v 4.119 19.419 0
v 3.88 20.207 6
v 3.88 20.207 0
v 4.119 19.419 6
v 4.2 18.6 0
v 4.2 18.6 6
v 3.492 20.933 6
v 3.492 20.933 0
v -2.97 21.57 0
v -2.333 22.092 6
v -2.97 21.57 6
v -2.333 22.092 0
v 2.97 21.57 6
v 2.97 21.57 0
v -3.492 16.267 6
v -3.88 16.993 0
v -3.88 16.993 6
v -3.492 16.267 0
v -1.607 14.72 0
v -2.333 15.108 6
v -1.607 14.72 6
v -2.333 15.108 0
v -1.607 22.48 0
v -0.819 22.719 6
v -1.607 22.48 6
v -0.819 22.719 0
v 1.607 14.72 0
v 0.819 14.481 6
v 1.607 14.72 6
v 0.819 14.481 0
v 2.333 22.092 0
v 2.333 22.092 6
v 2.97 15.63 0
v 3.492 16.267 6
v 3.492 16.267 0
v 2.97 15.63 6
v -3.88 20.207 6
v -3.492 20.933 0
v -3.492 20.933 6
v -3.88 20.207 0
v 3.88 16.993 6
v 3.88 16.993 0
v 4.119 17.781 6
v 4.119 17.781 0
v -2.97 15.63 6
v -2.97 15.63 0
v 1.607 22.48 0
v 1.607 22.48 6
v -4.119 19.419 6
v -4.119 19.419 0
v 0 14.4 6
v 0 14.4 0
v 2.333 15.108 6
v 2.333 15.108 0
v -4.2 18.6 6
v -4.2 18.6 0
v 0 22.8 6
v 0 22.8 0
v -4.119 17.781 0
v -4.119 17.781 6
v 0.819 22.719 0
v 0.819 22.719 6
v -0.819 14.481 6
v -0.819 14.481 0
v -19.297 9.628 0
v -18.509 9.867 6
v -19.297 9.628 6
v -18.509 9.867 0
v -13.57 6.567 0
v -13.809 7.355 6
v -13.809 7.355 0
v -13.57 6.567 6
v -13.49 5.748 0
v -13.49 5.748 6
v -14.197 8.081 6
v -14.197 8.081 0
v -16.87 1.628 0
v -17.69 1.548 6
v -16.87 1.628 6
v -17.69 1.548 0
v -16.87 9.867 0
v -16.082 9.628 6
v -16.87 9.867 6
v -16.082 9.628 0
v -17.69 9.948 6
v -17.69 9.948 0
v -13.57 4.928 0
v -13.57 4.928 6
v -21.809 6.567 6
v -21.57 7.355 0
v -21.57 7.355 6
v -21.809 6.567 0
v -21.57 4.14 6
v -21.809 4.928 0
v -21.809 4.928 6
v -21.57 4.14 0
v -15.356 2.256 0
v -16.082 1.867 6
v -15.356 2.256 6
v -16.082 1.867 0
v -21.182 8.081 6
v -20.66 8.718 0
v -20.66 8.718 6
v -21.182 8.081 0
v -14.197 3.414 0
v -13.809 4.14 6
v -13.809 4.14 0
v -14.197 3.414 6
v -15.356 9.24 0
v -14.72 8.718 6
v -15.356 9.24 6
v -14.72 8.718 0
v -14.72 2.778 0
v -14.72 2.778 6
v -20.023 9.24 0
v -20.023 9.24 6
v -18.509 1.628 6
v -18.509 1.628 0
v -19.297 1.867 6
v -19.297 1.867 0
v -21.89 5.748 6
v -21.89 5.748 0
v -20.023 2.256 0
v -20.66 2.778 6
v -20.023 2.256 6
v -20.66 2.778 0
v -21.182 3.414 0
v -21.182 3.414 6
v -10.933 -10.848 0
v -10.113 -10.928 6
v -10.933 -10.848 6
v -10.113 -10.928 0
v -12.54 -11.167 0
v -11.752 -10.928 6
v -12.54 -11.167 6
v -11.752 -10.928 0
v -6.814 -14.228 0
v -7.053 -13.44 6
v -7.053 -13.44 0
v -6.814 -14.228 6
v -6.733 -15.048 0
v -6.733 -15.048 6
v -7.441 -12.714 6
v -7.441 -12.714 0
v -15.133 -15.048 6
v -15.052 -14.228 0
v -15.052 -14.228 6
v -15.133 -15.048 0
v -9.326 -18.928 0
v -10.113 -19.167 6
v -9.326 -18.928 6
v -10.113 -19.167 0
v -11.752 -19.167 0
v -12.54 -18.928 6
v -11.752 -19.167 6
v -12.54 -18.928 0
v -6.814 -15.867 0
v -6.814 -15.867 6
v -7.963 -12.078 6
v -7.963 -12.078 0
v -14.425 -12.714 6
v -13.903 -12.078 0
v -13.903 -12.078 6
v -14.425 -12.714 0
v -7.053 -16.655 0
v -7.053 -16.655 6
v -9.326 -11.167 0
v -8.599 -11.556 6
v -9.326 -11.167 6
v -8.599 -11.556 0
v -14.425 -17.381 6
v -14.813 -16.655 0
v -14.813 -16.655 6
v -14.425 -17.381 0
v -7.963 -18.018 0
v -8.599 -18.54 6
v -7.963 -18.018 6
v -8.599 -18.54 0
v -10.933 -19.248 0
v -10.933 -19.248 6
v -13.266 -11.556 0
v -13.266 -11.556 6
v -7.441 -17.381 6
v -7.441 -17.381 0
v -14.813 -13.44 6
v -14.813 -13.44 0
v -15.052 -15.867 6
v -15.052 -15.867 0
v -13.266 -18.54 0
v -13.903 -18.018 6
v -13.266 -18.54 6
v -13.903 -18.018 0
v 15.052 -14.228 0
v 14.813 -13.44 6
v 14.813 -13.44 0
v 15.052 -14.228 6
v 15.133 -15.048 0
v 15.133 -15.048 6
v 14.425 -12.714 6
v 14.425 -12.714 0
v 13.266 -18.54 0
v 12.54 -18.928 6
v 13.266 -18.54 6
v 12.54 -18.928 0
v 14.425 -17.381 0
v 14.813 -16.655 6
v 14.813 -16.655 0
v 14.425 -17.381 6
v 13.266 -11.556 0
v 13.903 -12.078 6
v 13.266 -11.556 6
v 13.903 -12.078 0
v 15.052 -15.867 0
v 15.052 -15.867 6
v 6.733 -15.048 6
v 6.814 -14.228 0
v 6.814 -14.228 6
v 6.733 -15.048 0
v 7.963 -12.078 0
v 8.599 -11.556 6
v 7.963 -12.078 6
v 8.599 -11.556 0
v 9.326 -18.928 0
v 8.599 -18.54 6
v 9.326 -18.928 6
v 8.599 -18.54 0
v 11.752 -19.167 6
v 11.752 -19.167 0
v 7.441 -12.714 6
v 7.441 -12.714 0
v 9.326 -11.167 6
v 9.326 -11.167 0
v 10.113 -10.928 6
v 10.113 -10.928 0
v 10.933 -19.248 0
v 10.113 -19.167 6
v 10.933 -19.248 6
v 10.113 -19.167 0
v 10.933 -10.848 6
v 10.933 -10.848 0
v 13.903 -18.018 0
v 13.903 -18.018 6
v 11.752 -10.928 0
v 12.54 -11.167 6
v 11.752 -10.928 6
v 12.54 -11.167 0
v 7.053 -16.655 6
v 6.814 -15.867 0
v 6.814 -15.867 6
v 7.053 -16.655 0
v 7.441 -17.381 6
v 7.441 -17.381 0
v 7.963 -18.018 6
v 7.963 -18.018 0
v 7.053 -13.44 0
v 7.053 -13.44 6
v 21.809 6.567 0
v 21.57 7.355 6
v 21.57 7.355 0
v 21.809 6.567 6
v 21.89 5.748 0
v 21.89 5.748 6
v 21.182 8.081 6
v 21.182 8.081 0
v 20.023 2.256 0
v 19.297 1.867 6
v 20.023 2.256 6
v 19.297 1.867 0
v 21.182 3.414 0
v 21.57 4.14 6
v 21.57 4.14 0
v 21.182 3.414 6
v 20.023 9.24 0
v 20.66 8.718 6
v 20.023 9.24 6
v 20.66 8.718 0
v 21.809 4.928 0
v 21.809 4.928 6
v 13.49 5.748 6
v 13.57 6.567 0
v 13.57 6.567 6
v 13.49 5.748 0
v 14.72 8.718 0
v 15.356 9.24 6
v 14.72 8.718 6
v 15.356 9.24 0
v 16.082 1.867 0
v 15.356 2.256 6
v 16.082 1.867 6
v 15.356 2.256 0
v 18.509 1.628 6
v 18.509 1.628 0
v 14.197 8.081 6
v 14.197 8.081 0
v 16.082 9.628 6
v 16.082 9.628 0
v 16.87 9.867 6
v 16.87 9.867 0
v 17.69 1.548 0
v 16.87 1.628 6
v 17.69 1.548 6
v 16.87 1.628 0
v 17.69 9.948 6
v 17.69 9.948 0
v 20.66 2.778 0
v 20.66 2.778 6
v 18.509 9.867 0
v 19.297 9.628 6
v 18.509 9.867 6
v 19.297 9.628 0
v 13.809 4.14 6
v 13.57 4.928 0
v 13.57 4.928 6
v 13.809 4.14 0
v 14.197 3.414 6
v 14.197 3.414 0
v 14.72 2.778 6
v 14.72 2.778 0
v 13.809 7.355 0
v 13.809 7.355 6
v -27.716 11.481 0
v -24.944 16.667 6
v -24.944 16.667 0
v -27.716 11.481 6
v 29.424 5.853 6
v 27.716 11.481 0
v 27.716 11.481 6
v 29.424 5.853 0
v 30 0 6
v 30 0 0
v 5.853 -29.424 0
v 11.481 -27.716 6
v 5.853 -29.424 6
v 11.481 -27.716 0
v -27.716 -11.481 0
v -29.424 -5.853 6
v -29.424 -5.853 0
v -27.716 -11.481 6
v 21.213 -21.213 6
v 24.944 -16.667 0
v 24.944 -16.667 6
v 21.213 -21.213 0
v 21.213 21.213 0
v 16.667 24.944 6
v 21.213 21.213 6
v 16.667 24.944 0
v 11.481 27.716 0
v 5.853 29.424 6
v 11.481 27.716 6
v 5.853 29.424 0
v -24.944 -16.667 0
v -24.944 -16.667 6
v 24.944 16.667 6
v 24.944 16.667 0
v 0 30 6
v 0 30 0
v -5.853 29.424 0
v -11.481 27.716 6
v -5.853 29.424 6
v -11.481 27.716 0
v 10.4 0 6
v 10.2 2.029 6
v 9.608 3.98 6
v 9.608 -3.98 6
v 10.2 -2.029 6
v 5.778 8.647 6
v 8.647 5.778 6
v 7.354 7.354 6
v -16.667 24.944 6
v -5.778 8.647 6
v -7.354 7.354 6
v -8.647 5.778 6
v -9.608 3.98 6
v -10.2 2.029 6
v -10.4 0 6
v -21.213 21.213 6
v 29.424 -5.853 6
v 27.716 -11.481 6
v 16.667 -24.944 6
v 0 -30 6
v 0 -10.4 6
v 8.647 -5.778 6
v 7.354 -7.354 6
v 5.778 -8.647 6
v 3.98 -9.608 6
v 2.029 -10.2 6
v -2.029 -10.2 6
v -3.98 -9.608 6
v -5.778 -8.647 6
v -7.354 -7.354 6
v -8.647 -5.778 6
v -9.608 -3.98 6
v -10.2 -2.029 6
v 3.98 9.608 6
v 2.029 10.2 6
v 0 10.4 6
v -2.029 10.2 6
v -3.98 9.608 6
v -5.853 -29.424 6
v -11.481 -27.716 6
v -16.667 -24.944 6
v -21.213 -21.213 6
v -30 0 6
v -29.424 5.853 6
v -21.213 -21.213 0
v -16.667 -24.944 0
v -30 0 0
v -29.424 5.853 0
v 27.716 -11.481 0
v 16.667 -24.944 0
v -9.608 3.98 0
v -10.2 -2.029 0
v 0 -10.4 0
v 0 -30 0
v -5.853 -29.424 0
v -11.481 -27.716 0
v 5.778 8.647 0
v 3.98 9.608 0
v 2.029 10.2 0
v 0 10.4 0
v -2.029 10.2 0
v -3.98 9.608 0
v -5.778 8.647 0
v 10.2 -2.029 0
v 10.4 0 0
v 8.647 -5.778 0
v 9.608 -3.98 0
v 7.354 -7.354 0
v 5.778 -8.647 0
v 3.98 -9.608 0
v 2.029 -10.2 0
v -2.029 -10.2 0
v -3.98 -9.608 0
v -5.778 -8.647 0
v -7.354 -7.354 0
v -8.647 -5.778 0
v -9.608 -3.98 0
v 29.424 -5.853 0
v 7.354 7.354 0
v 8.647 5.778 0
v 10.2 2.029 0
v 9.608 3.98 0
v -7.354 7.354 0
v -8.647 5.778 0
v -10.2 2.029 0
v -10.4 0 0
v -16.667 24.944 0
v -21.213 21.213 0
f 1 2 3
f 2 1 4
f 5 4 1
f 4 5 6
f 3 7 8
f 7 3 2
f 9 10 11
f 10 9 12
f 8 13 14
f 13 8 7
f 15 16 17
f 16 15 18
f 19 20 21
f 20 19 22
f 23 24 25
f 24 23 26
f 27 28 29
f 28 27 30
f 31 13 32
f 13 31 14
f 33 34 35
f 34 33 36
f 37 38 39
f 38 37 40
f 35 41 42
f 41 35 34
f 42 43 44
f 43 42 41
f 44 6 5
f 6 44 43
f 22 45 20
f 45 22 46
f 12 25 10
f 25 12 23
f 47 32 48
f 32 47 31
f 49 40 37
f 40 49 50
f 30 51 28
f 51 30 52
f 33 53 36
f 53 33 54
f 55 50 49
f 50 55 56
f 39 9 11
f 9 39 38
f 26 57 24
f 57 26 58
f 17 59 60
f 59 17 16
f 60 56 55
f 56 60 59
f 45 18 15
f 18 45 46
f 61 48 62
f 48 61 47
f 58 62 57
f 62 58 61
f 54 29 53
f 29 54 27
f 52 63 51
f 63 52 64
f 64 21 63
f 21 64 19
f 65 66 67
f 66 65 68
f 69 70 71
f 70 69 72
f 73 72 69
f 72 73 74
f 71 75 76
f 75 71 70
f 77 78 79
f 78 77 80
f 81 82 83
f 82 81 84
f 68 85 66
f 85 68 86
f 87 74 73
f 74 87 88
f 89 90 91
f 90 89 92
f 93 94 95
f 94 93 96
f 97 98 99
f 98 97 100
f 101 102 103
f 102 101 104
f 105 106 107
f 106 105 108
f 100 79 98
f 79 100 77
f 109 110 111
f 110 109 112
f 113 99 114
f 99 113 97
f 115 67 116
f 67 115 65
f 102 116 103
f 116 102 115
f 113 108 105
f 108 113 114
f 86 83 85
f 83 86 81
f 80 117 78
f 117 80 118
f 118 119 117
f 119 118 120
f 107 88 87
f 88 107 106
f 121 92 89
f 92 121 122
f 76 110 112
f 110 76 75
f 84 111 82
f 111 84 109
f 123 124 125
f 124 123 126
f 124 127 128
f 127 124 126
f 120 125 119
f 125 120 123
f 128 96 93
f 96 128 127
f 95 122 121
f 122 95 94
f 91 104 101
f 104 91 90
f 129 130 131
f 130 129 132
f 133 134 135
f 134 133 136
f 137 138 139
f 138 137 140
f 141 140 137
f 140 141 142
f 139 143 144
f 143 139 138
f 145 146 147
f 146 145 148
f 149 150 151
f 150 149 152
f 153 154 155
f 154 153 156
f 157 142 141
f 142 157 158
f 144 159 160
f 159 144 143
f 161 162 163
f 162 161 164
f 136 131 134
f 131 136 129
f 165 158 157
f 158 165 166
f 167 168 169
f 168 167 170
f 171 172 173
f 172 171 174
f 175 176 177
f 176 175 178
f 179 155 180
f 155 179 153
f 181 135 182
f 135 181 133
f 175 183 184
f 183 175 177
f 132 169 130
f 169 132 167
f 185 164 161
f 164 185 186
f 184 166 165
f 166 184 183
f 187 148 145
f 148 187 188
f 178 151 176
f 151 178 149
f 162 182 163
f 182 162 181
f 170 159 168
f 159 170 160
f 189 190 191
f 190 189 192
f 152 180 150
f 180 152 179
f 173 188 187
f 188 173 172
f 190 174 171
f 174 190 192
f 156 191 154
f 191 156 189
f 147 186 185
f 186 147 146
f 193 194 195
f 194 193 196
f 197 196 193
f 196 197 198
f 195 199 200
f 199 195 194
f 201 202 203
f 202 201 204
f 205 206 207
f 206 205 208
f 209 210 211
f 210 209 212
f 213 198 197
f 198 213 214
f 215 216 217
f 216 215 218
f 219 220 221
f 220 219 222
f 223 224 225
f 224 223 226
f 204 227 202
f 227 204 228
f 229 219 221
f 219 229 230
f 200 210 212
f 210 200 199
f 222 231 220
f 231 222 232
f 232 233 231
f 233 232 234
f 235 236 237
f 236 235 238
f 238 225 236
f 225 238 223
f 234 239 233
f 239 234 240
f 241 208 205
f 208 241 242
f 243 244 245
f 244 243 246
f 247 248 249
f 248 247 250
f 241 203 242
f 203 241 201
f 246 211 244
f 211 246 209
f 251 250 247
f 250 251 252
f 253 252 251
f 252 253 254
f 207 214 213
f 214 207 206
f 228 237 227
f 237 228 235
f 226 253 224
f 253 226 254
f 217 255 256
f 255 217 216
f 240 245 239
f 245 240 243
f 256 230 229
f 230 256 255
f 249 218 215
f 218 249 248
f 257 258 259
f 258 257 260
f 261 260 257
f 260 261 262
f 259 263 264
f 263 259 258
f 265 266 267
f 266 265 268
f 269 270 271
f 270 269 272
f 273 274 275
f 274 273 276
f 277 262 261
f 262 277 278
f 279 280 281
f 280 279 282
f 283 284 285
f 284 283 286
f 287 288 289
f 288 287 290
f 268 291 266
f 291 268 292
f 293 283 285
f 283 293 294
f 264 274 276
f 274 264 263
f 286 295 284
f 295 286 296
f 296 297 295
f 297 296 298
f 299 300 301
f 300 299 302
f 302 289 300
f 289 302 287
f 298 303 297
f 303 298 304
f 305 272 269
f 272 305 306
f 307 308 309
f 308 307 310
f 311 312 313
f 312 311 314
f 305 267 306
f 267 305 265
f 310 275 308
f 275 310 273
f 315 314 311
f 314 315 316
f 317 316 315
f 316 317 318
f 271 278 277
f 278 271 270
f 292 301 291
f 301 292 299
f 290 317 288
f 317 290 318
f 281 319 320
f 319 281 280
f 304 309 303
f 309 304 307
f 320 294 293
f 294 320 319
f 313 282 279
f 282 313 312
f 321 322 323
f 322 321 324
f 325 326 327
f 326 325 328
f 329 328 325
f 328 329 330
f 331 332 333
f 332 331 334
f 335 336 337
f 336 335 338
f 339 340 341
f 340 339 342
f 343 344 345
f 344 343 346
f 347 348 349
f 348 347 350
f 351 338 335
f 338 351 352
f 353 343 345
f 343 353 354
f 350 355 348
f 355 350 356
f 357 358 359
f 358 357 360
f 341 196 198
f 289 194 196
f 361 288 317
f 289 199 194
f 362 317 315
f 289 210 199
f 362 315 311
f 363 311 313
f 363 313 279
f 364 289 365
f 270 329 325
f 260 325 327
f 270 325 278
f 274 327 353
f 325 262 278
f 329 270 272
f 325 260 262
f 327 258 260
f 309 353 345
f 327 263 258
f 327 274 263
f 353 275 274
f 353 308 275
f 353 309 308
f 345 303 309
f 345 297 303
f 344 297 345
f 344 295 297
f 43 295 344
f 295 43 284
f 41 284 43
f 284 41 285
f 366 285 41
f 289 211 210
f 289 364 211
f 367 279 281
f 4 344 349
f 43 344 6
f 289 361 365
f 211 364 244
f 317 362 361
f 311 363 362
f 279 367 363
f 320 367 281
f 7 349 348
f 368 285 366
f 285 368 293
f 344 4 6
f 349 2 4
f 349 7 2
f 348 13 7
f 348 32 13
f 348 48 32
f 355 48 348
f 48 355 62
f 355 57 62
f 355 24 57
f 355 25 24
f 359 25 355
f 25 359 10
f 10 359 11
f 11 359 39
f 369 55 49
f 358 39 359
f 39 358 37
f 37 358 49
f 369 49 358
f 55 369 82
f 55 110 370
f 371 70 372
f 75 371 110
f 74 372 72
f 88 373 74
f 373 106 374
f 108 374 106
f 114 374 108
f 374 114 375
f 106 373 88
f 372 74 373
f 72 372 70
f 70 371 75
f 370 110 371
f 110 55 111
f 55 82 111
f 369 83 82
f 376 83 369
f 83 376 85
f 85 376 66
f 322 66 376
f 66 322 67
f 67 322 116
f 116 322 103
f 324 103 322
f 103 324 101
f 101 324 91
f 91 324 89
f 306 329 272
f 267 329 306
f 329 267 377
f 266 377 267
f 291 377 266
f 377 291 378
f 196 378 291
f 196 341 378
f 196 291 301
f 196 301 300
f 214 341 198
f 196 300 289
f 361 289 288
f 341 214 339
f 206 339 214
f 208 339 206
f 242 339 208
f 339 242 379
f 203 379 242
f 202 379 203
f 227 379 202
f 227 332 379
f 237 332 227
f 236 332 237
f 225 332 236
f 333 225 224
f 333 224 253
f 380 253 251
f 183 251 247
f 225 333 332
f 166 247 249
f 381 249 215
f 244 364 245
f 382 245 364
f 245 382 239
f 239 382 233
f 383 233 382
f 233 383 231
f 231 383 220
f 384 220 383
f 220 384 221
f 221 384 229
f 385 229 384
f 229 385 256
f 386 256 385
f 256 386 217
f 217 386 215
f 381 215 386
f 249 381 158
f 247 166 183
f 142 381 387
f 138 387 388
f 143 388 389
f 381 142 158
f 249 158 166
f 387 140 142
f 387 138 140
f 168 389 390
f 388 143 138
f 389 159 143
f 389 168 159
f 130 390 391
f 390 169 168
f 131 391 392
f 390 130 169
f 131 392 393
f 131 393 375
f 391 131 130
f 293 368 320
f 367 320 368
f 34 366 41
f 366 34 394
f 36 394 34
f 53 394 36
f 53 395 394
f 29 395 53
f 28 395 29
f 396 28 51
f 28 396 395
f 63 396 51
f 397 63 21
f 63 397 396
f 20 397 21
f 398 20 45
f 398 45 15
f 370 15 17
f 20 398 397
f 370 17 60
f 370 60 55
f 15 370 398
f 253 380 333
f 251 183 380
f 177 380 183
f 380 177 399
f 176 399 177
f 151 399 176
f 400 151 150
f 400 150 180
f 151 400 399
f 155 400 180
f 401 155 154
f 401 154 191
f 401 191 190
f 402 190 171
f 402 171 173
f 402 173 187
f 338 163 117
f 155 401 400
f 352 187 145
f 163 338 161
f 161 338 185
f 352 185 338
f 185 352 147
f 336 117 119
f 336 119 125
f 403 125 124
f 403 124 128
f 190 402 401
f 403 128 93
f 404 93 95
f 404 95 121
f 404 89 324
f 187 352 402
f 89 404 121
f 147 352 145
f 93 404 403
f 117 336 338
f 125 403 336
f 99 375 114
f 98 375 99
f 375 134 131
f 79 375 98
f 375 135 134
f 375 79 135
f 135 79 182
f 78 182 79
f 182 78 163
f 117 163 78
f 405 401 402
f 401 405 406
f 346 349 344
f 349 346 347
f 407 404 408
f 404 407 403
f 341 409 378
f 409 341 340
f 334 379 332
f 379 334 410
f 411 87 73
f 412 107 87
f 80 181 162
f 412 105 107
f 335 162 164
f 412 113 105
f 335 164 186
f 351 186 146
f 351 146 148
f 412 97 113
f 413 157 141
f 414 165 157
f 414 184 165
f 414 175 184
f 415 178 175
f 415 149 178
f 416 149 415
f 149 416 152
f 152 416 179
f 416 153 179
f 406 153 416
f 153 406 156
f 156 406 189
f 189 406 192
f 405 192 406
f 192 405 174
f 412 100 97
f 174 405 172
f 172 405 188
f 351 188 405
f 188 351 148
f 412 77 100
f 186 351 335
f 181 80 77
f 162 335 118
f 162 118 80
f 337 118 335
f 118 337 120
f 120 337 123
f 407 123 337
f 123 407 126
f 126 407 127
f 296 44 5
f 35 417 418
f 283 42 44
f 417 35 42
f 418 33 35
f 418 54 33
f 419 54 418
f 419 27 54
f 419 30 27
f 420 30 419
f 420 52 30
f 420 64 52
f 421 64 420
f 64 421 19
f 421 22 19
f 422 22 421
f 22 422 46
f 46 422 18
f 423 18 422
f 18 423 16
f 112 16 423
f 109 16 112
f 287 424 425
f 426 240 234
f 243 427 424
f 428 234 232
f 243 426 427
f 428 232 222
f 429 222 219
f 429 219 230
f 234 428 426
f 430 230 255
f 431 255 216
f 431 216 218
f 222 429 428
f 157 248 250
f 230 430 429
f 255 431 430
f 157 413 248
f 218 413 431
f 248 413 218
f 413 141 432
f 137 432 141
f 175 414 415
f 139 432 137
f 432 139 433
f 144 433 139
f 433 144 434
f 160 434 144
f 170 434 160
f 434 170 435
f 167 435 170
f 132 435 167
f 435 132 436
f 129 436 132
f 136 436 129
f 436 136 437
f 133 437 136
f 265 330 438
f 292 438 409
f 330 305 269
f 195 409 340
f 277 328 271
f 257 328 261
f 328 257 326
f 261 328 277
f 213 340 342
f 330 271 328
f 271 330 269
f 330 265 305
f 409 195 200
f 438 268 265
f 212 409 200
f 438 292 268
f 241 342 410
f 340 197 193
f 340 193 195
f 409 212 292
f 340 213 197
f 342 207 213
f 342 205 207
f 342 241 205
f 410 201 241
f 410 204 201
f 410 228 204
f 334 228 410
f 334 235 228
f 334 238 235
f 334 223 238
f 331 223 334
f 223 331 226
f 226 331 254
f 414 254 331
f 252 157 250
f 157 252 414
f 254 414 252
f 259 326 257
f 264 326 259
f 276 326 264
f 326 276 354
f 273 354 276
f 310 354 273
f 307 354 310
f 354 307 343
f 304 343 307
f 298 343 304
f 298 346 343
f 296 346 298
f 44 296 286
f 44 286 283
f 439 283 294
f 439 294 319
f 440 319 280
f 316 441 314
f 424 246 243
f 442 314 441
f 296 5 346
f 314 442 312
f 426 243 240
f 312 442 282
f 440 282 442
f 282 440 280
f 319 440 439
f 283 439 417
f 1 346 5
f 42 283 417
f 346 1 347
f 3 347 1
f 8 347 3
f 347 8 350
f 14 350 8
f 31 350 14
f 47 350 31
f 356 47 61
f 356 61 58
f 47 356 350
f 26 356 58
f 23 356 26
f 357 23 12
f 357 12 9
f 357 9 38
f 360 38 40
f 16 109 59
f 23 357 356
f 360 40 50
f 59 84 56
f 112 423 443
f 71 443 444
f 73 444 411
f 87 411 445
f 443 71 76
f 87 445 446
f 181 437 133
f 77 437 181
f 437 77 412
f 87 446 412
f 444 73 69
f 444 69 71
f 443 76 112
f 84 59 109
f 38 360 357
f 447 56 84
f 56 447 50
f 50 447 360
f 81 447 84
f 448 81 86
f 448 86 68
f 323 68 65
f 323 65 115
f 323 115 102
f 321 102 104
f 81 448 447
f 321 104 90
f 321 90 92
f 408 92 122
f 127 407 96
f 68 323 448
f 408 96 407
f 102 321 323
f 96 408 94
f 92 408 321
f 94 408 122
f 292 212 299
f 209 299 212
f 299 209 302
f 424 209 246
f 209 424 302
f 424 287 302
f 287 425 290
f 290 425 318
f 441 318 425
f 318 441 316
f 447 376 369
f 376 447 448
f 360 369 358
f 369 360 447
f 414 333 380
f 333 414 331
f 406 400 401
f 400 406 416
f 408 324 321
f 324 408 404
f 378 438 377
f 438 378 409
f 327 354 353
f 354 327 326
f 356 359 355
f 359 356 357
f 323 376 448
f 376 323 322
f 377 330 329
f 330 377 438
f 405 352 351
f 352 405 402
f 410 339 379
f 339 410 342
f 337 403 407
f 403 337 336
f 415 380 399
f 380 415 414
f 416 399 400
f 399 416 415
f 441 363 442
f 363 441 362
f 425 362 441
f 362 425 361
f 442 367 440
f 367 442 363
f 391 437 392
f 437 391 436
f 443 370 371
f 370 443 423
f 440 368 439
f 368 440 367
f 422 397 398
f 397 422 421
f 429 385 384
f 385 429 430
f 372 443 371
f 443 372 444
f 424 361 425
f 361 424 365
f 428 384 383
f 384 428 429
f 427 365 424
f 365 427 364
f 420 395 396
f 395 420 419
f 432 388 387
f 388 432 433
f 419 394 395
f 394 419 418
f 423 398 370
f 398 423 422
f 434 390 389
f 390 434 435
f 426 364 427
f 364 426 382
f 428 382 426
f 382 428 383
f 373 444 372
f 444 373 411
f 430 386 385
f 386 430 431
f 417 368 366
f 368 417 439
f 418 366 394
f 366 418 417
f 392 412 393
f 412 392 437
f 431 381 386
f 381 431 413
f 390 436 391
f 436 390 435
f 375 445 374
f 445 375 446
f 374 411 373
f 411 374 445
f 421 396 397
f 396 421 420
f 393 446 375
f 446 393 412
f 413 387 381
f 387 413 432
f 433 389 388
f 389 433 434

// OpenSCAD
$fn = 32;

// ----------------------------------------------------------------------
// Flange Ø60 x 6
// 5 holes on a Ø37.2 bolt circle, bolted joints
// ----------------------------------------------------------------------

// --- parameters (mm) ---
flange_d = 60;   // outside diameter of the flange
thickness = 6;   // flange thickness
holes = 5;       // number of bolt holes
pcd = 37.2;      // bolt circle diameter
start_deg = 90;  // angle of the first hole, from +X
hole_d = 8.4;    // bolt hole diameter
bore_d = 20.8;   // central through bore
hub_d = 32.8;    // hub outside diameter
hub_h = 0;       // hub height above the flange face (0 = no hub)

// --- derived feature positions (mm) ---
height = thickness + hub_h;  // = 6   overall height of the part
pcd_r = pcd / 2;             // = 18.6   bolt circle radius
hole_step = 360 / holes;     // = 72   angular pitch
feature_centers = [
  [pcd_r * cos(start_deg + 0 * hole_step), pcd_r * sin(start_deg + 0 * hole_step)],
  [pcd_r * cos(start_deg + 1 * hole_step), pcd_r * sin(start_deg + 1 * hole_step)],
  [pcd_r * cos(start_deg + 2 * hole_step), pcd_r * sin(start_deg + 2 * hole_step)],
  [pcd_r * cos(start_deg + 3 * hole_step), pcd_r * sin(start_deg + 3 * hole_step)],
  [pcd_r * cos(start_deg + 4 * hole_step), pcd_r * sin(start_deg + 4 * hole_step)]
];   // bolt hole centres on the pitch circle

// flange disc, every hole and the bore cut straight through
difference() {
  union() {
    cylinder(d = flange_d, h = thickness);
  }
  translate([0, 0, -1]) cylinder(d = bore_d, h = height + 2);  // bore, through
  for (centre = feature_centers)
    translate([centre[0], centre[1], -1]) cylinder(d = hole_d, h = thickness + 2);
}
